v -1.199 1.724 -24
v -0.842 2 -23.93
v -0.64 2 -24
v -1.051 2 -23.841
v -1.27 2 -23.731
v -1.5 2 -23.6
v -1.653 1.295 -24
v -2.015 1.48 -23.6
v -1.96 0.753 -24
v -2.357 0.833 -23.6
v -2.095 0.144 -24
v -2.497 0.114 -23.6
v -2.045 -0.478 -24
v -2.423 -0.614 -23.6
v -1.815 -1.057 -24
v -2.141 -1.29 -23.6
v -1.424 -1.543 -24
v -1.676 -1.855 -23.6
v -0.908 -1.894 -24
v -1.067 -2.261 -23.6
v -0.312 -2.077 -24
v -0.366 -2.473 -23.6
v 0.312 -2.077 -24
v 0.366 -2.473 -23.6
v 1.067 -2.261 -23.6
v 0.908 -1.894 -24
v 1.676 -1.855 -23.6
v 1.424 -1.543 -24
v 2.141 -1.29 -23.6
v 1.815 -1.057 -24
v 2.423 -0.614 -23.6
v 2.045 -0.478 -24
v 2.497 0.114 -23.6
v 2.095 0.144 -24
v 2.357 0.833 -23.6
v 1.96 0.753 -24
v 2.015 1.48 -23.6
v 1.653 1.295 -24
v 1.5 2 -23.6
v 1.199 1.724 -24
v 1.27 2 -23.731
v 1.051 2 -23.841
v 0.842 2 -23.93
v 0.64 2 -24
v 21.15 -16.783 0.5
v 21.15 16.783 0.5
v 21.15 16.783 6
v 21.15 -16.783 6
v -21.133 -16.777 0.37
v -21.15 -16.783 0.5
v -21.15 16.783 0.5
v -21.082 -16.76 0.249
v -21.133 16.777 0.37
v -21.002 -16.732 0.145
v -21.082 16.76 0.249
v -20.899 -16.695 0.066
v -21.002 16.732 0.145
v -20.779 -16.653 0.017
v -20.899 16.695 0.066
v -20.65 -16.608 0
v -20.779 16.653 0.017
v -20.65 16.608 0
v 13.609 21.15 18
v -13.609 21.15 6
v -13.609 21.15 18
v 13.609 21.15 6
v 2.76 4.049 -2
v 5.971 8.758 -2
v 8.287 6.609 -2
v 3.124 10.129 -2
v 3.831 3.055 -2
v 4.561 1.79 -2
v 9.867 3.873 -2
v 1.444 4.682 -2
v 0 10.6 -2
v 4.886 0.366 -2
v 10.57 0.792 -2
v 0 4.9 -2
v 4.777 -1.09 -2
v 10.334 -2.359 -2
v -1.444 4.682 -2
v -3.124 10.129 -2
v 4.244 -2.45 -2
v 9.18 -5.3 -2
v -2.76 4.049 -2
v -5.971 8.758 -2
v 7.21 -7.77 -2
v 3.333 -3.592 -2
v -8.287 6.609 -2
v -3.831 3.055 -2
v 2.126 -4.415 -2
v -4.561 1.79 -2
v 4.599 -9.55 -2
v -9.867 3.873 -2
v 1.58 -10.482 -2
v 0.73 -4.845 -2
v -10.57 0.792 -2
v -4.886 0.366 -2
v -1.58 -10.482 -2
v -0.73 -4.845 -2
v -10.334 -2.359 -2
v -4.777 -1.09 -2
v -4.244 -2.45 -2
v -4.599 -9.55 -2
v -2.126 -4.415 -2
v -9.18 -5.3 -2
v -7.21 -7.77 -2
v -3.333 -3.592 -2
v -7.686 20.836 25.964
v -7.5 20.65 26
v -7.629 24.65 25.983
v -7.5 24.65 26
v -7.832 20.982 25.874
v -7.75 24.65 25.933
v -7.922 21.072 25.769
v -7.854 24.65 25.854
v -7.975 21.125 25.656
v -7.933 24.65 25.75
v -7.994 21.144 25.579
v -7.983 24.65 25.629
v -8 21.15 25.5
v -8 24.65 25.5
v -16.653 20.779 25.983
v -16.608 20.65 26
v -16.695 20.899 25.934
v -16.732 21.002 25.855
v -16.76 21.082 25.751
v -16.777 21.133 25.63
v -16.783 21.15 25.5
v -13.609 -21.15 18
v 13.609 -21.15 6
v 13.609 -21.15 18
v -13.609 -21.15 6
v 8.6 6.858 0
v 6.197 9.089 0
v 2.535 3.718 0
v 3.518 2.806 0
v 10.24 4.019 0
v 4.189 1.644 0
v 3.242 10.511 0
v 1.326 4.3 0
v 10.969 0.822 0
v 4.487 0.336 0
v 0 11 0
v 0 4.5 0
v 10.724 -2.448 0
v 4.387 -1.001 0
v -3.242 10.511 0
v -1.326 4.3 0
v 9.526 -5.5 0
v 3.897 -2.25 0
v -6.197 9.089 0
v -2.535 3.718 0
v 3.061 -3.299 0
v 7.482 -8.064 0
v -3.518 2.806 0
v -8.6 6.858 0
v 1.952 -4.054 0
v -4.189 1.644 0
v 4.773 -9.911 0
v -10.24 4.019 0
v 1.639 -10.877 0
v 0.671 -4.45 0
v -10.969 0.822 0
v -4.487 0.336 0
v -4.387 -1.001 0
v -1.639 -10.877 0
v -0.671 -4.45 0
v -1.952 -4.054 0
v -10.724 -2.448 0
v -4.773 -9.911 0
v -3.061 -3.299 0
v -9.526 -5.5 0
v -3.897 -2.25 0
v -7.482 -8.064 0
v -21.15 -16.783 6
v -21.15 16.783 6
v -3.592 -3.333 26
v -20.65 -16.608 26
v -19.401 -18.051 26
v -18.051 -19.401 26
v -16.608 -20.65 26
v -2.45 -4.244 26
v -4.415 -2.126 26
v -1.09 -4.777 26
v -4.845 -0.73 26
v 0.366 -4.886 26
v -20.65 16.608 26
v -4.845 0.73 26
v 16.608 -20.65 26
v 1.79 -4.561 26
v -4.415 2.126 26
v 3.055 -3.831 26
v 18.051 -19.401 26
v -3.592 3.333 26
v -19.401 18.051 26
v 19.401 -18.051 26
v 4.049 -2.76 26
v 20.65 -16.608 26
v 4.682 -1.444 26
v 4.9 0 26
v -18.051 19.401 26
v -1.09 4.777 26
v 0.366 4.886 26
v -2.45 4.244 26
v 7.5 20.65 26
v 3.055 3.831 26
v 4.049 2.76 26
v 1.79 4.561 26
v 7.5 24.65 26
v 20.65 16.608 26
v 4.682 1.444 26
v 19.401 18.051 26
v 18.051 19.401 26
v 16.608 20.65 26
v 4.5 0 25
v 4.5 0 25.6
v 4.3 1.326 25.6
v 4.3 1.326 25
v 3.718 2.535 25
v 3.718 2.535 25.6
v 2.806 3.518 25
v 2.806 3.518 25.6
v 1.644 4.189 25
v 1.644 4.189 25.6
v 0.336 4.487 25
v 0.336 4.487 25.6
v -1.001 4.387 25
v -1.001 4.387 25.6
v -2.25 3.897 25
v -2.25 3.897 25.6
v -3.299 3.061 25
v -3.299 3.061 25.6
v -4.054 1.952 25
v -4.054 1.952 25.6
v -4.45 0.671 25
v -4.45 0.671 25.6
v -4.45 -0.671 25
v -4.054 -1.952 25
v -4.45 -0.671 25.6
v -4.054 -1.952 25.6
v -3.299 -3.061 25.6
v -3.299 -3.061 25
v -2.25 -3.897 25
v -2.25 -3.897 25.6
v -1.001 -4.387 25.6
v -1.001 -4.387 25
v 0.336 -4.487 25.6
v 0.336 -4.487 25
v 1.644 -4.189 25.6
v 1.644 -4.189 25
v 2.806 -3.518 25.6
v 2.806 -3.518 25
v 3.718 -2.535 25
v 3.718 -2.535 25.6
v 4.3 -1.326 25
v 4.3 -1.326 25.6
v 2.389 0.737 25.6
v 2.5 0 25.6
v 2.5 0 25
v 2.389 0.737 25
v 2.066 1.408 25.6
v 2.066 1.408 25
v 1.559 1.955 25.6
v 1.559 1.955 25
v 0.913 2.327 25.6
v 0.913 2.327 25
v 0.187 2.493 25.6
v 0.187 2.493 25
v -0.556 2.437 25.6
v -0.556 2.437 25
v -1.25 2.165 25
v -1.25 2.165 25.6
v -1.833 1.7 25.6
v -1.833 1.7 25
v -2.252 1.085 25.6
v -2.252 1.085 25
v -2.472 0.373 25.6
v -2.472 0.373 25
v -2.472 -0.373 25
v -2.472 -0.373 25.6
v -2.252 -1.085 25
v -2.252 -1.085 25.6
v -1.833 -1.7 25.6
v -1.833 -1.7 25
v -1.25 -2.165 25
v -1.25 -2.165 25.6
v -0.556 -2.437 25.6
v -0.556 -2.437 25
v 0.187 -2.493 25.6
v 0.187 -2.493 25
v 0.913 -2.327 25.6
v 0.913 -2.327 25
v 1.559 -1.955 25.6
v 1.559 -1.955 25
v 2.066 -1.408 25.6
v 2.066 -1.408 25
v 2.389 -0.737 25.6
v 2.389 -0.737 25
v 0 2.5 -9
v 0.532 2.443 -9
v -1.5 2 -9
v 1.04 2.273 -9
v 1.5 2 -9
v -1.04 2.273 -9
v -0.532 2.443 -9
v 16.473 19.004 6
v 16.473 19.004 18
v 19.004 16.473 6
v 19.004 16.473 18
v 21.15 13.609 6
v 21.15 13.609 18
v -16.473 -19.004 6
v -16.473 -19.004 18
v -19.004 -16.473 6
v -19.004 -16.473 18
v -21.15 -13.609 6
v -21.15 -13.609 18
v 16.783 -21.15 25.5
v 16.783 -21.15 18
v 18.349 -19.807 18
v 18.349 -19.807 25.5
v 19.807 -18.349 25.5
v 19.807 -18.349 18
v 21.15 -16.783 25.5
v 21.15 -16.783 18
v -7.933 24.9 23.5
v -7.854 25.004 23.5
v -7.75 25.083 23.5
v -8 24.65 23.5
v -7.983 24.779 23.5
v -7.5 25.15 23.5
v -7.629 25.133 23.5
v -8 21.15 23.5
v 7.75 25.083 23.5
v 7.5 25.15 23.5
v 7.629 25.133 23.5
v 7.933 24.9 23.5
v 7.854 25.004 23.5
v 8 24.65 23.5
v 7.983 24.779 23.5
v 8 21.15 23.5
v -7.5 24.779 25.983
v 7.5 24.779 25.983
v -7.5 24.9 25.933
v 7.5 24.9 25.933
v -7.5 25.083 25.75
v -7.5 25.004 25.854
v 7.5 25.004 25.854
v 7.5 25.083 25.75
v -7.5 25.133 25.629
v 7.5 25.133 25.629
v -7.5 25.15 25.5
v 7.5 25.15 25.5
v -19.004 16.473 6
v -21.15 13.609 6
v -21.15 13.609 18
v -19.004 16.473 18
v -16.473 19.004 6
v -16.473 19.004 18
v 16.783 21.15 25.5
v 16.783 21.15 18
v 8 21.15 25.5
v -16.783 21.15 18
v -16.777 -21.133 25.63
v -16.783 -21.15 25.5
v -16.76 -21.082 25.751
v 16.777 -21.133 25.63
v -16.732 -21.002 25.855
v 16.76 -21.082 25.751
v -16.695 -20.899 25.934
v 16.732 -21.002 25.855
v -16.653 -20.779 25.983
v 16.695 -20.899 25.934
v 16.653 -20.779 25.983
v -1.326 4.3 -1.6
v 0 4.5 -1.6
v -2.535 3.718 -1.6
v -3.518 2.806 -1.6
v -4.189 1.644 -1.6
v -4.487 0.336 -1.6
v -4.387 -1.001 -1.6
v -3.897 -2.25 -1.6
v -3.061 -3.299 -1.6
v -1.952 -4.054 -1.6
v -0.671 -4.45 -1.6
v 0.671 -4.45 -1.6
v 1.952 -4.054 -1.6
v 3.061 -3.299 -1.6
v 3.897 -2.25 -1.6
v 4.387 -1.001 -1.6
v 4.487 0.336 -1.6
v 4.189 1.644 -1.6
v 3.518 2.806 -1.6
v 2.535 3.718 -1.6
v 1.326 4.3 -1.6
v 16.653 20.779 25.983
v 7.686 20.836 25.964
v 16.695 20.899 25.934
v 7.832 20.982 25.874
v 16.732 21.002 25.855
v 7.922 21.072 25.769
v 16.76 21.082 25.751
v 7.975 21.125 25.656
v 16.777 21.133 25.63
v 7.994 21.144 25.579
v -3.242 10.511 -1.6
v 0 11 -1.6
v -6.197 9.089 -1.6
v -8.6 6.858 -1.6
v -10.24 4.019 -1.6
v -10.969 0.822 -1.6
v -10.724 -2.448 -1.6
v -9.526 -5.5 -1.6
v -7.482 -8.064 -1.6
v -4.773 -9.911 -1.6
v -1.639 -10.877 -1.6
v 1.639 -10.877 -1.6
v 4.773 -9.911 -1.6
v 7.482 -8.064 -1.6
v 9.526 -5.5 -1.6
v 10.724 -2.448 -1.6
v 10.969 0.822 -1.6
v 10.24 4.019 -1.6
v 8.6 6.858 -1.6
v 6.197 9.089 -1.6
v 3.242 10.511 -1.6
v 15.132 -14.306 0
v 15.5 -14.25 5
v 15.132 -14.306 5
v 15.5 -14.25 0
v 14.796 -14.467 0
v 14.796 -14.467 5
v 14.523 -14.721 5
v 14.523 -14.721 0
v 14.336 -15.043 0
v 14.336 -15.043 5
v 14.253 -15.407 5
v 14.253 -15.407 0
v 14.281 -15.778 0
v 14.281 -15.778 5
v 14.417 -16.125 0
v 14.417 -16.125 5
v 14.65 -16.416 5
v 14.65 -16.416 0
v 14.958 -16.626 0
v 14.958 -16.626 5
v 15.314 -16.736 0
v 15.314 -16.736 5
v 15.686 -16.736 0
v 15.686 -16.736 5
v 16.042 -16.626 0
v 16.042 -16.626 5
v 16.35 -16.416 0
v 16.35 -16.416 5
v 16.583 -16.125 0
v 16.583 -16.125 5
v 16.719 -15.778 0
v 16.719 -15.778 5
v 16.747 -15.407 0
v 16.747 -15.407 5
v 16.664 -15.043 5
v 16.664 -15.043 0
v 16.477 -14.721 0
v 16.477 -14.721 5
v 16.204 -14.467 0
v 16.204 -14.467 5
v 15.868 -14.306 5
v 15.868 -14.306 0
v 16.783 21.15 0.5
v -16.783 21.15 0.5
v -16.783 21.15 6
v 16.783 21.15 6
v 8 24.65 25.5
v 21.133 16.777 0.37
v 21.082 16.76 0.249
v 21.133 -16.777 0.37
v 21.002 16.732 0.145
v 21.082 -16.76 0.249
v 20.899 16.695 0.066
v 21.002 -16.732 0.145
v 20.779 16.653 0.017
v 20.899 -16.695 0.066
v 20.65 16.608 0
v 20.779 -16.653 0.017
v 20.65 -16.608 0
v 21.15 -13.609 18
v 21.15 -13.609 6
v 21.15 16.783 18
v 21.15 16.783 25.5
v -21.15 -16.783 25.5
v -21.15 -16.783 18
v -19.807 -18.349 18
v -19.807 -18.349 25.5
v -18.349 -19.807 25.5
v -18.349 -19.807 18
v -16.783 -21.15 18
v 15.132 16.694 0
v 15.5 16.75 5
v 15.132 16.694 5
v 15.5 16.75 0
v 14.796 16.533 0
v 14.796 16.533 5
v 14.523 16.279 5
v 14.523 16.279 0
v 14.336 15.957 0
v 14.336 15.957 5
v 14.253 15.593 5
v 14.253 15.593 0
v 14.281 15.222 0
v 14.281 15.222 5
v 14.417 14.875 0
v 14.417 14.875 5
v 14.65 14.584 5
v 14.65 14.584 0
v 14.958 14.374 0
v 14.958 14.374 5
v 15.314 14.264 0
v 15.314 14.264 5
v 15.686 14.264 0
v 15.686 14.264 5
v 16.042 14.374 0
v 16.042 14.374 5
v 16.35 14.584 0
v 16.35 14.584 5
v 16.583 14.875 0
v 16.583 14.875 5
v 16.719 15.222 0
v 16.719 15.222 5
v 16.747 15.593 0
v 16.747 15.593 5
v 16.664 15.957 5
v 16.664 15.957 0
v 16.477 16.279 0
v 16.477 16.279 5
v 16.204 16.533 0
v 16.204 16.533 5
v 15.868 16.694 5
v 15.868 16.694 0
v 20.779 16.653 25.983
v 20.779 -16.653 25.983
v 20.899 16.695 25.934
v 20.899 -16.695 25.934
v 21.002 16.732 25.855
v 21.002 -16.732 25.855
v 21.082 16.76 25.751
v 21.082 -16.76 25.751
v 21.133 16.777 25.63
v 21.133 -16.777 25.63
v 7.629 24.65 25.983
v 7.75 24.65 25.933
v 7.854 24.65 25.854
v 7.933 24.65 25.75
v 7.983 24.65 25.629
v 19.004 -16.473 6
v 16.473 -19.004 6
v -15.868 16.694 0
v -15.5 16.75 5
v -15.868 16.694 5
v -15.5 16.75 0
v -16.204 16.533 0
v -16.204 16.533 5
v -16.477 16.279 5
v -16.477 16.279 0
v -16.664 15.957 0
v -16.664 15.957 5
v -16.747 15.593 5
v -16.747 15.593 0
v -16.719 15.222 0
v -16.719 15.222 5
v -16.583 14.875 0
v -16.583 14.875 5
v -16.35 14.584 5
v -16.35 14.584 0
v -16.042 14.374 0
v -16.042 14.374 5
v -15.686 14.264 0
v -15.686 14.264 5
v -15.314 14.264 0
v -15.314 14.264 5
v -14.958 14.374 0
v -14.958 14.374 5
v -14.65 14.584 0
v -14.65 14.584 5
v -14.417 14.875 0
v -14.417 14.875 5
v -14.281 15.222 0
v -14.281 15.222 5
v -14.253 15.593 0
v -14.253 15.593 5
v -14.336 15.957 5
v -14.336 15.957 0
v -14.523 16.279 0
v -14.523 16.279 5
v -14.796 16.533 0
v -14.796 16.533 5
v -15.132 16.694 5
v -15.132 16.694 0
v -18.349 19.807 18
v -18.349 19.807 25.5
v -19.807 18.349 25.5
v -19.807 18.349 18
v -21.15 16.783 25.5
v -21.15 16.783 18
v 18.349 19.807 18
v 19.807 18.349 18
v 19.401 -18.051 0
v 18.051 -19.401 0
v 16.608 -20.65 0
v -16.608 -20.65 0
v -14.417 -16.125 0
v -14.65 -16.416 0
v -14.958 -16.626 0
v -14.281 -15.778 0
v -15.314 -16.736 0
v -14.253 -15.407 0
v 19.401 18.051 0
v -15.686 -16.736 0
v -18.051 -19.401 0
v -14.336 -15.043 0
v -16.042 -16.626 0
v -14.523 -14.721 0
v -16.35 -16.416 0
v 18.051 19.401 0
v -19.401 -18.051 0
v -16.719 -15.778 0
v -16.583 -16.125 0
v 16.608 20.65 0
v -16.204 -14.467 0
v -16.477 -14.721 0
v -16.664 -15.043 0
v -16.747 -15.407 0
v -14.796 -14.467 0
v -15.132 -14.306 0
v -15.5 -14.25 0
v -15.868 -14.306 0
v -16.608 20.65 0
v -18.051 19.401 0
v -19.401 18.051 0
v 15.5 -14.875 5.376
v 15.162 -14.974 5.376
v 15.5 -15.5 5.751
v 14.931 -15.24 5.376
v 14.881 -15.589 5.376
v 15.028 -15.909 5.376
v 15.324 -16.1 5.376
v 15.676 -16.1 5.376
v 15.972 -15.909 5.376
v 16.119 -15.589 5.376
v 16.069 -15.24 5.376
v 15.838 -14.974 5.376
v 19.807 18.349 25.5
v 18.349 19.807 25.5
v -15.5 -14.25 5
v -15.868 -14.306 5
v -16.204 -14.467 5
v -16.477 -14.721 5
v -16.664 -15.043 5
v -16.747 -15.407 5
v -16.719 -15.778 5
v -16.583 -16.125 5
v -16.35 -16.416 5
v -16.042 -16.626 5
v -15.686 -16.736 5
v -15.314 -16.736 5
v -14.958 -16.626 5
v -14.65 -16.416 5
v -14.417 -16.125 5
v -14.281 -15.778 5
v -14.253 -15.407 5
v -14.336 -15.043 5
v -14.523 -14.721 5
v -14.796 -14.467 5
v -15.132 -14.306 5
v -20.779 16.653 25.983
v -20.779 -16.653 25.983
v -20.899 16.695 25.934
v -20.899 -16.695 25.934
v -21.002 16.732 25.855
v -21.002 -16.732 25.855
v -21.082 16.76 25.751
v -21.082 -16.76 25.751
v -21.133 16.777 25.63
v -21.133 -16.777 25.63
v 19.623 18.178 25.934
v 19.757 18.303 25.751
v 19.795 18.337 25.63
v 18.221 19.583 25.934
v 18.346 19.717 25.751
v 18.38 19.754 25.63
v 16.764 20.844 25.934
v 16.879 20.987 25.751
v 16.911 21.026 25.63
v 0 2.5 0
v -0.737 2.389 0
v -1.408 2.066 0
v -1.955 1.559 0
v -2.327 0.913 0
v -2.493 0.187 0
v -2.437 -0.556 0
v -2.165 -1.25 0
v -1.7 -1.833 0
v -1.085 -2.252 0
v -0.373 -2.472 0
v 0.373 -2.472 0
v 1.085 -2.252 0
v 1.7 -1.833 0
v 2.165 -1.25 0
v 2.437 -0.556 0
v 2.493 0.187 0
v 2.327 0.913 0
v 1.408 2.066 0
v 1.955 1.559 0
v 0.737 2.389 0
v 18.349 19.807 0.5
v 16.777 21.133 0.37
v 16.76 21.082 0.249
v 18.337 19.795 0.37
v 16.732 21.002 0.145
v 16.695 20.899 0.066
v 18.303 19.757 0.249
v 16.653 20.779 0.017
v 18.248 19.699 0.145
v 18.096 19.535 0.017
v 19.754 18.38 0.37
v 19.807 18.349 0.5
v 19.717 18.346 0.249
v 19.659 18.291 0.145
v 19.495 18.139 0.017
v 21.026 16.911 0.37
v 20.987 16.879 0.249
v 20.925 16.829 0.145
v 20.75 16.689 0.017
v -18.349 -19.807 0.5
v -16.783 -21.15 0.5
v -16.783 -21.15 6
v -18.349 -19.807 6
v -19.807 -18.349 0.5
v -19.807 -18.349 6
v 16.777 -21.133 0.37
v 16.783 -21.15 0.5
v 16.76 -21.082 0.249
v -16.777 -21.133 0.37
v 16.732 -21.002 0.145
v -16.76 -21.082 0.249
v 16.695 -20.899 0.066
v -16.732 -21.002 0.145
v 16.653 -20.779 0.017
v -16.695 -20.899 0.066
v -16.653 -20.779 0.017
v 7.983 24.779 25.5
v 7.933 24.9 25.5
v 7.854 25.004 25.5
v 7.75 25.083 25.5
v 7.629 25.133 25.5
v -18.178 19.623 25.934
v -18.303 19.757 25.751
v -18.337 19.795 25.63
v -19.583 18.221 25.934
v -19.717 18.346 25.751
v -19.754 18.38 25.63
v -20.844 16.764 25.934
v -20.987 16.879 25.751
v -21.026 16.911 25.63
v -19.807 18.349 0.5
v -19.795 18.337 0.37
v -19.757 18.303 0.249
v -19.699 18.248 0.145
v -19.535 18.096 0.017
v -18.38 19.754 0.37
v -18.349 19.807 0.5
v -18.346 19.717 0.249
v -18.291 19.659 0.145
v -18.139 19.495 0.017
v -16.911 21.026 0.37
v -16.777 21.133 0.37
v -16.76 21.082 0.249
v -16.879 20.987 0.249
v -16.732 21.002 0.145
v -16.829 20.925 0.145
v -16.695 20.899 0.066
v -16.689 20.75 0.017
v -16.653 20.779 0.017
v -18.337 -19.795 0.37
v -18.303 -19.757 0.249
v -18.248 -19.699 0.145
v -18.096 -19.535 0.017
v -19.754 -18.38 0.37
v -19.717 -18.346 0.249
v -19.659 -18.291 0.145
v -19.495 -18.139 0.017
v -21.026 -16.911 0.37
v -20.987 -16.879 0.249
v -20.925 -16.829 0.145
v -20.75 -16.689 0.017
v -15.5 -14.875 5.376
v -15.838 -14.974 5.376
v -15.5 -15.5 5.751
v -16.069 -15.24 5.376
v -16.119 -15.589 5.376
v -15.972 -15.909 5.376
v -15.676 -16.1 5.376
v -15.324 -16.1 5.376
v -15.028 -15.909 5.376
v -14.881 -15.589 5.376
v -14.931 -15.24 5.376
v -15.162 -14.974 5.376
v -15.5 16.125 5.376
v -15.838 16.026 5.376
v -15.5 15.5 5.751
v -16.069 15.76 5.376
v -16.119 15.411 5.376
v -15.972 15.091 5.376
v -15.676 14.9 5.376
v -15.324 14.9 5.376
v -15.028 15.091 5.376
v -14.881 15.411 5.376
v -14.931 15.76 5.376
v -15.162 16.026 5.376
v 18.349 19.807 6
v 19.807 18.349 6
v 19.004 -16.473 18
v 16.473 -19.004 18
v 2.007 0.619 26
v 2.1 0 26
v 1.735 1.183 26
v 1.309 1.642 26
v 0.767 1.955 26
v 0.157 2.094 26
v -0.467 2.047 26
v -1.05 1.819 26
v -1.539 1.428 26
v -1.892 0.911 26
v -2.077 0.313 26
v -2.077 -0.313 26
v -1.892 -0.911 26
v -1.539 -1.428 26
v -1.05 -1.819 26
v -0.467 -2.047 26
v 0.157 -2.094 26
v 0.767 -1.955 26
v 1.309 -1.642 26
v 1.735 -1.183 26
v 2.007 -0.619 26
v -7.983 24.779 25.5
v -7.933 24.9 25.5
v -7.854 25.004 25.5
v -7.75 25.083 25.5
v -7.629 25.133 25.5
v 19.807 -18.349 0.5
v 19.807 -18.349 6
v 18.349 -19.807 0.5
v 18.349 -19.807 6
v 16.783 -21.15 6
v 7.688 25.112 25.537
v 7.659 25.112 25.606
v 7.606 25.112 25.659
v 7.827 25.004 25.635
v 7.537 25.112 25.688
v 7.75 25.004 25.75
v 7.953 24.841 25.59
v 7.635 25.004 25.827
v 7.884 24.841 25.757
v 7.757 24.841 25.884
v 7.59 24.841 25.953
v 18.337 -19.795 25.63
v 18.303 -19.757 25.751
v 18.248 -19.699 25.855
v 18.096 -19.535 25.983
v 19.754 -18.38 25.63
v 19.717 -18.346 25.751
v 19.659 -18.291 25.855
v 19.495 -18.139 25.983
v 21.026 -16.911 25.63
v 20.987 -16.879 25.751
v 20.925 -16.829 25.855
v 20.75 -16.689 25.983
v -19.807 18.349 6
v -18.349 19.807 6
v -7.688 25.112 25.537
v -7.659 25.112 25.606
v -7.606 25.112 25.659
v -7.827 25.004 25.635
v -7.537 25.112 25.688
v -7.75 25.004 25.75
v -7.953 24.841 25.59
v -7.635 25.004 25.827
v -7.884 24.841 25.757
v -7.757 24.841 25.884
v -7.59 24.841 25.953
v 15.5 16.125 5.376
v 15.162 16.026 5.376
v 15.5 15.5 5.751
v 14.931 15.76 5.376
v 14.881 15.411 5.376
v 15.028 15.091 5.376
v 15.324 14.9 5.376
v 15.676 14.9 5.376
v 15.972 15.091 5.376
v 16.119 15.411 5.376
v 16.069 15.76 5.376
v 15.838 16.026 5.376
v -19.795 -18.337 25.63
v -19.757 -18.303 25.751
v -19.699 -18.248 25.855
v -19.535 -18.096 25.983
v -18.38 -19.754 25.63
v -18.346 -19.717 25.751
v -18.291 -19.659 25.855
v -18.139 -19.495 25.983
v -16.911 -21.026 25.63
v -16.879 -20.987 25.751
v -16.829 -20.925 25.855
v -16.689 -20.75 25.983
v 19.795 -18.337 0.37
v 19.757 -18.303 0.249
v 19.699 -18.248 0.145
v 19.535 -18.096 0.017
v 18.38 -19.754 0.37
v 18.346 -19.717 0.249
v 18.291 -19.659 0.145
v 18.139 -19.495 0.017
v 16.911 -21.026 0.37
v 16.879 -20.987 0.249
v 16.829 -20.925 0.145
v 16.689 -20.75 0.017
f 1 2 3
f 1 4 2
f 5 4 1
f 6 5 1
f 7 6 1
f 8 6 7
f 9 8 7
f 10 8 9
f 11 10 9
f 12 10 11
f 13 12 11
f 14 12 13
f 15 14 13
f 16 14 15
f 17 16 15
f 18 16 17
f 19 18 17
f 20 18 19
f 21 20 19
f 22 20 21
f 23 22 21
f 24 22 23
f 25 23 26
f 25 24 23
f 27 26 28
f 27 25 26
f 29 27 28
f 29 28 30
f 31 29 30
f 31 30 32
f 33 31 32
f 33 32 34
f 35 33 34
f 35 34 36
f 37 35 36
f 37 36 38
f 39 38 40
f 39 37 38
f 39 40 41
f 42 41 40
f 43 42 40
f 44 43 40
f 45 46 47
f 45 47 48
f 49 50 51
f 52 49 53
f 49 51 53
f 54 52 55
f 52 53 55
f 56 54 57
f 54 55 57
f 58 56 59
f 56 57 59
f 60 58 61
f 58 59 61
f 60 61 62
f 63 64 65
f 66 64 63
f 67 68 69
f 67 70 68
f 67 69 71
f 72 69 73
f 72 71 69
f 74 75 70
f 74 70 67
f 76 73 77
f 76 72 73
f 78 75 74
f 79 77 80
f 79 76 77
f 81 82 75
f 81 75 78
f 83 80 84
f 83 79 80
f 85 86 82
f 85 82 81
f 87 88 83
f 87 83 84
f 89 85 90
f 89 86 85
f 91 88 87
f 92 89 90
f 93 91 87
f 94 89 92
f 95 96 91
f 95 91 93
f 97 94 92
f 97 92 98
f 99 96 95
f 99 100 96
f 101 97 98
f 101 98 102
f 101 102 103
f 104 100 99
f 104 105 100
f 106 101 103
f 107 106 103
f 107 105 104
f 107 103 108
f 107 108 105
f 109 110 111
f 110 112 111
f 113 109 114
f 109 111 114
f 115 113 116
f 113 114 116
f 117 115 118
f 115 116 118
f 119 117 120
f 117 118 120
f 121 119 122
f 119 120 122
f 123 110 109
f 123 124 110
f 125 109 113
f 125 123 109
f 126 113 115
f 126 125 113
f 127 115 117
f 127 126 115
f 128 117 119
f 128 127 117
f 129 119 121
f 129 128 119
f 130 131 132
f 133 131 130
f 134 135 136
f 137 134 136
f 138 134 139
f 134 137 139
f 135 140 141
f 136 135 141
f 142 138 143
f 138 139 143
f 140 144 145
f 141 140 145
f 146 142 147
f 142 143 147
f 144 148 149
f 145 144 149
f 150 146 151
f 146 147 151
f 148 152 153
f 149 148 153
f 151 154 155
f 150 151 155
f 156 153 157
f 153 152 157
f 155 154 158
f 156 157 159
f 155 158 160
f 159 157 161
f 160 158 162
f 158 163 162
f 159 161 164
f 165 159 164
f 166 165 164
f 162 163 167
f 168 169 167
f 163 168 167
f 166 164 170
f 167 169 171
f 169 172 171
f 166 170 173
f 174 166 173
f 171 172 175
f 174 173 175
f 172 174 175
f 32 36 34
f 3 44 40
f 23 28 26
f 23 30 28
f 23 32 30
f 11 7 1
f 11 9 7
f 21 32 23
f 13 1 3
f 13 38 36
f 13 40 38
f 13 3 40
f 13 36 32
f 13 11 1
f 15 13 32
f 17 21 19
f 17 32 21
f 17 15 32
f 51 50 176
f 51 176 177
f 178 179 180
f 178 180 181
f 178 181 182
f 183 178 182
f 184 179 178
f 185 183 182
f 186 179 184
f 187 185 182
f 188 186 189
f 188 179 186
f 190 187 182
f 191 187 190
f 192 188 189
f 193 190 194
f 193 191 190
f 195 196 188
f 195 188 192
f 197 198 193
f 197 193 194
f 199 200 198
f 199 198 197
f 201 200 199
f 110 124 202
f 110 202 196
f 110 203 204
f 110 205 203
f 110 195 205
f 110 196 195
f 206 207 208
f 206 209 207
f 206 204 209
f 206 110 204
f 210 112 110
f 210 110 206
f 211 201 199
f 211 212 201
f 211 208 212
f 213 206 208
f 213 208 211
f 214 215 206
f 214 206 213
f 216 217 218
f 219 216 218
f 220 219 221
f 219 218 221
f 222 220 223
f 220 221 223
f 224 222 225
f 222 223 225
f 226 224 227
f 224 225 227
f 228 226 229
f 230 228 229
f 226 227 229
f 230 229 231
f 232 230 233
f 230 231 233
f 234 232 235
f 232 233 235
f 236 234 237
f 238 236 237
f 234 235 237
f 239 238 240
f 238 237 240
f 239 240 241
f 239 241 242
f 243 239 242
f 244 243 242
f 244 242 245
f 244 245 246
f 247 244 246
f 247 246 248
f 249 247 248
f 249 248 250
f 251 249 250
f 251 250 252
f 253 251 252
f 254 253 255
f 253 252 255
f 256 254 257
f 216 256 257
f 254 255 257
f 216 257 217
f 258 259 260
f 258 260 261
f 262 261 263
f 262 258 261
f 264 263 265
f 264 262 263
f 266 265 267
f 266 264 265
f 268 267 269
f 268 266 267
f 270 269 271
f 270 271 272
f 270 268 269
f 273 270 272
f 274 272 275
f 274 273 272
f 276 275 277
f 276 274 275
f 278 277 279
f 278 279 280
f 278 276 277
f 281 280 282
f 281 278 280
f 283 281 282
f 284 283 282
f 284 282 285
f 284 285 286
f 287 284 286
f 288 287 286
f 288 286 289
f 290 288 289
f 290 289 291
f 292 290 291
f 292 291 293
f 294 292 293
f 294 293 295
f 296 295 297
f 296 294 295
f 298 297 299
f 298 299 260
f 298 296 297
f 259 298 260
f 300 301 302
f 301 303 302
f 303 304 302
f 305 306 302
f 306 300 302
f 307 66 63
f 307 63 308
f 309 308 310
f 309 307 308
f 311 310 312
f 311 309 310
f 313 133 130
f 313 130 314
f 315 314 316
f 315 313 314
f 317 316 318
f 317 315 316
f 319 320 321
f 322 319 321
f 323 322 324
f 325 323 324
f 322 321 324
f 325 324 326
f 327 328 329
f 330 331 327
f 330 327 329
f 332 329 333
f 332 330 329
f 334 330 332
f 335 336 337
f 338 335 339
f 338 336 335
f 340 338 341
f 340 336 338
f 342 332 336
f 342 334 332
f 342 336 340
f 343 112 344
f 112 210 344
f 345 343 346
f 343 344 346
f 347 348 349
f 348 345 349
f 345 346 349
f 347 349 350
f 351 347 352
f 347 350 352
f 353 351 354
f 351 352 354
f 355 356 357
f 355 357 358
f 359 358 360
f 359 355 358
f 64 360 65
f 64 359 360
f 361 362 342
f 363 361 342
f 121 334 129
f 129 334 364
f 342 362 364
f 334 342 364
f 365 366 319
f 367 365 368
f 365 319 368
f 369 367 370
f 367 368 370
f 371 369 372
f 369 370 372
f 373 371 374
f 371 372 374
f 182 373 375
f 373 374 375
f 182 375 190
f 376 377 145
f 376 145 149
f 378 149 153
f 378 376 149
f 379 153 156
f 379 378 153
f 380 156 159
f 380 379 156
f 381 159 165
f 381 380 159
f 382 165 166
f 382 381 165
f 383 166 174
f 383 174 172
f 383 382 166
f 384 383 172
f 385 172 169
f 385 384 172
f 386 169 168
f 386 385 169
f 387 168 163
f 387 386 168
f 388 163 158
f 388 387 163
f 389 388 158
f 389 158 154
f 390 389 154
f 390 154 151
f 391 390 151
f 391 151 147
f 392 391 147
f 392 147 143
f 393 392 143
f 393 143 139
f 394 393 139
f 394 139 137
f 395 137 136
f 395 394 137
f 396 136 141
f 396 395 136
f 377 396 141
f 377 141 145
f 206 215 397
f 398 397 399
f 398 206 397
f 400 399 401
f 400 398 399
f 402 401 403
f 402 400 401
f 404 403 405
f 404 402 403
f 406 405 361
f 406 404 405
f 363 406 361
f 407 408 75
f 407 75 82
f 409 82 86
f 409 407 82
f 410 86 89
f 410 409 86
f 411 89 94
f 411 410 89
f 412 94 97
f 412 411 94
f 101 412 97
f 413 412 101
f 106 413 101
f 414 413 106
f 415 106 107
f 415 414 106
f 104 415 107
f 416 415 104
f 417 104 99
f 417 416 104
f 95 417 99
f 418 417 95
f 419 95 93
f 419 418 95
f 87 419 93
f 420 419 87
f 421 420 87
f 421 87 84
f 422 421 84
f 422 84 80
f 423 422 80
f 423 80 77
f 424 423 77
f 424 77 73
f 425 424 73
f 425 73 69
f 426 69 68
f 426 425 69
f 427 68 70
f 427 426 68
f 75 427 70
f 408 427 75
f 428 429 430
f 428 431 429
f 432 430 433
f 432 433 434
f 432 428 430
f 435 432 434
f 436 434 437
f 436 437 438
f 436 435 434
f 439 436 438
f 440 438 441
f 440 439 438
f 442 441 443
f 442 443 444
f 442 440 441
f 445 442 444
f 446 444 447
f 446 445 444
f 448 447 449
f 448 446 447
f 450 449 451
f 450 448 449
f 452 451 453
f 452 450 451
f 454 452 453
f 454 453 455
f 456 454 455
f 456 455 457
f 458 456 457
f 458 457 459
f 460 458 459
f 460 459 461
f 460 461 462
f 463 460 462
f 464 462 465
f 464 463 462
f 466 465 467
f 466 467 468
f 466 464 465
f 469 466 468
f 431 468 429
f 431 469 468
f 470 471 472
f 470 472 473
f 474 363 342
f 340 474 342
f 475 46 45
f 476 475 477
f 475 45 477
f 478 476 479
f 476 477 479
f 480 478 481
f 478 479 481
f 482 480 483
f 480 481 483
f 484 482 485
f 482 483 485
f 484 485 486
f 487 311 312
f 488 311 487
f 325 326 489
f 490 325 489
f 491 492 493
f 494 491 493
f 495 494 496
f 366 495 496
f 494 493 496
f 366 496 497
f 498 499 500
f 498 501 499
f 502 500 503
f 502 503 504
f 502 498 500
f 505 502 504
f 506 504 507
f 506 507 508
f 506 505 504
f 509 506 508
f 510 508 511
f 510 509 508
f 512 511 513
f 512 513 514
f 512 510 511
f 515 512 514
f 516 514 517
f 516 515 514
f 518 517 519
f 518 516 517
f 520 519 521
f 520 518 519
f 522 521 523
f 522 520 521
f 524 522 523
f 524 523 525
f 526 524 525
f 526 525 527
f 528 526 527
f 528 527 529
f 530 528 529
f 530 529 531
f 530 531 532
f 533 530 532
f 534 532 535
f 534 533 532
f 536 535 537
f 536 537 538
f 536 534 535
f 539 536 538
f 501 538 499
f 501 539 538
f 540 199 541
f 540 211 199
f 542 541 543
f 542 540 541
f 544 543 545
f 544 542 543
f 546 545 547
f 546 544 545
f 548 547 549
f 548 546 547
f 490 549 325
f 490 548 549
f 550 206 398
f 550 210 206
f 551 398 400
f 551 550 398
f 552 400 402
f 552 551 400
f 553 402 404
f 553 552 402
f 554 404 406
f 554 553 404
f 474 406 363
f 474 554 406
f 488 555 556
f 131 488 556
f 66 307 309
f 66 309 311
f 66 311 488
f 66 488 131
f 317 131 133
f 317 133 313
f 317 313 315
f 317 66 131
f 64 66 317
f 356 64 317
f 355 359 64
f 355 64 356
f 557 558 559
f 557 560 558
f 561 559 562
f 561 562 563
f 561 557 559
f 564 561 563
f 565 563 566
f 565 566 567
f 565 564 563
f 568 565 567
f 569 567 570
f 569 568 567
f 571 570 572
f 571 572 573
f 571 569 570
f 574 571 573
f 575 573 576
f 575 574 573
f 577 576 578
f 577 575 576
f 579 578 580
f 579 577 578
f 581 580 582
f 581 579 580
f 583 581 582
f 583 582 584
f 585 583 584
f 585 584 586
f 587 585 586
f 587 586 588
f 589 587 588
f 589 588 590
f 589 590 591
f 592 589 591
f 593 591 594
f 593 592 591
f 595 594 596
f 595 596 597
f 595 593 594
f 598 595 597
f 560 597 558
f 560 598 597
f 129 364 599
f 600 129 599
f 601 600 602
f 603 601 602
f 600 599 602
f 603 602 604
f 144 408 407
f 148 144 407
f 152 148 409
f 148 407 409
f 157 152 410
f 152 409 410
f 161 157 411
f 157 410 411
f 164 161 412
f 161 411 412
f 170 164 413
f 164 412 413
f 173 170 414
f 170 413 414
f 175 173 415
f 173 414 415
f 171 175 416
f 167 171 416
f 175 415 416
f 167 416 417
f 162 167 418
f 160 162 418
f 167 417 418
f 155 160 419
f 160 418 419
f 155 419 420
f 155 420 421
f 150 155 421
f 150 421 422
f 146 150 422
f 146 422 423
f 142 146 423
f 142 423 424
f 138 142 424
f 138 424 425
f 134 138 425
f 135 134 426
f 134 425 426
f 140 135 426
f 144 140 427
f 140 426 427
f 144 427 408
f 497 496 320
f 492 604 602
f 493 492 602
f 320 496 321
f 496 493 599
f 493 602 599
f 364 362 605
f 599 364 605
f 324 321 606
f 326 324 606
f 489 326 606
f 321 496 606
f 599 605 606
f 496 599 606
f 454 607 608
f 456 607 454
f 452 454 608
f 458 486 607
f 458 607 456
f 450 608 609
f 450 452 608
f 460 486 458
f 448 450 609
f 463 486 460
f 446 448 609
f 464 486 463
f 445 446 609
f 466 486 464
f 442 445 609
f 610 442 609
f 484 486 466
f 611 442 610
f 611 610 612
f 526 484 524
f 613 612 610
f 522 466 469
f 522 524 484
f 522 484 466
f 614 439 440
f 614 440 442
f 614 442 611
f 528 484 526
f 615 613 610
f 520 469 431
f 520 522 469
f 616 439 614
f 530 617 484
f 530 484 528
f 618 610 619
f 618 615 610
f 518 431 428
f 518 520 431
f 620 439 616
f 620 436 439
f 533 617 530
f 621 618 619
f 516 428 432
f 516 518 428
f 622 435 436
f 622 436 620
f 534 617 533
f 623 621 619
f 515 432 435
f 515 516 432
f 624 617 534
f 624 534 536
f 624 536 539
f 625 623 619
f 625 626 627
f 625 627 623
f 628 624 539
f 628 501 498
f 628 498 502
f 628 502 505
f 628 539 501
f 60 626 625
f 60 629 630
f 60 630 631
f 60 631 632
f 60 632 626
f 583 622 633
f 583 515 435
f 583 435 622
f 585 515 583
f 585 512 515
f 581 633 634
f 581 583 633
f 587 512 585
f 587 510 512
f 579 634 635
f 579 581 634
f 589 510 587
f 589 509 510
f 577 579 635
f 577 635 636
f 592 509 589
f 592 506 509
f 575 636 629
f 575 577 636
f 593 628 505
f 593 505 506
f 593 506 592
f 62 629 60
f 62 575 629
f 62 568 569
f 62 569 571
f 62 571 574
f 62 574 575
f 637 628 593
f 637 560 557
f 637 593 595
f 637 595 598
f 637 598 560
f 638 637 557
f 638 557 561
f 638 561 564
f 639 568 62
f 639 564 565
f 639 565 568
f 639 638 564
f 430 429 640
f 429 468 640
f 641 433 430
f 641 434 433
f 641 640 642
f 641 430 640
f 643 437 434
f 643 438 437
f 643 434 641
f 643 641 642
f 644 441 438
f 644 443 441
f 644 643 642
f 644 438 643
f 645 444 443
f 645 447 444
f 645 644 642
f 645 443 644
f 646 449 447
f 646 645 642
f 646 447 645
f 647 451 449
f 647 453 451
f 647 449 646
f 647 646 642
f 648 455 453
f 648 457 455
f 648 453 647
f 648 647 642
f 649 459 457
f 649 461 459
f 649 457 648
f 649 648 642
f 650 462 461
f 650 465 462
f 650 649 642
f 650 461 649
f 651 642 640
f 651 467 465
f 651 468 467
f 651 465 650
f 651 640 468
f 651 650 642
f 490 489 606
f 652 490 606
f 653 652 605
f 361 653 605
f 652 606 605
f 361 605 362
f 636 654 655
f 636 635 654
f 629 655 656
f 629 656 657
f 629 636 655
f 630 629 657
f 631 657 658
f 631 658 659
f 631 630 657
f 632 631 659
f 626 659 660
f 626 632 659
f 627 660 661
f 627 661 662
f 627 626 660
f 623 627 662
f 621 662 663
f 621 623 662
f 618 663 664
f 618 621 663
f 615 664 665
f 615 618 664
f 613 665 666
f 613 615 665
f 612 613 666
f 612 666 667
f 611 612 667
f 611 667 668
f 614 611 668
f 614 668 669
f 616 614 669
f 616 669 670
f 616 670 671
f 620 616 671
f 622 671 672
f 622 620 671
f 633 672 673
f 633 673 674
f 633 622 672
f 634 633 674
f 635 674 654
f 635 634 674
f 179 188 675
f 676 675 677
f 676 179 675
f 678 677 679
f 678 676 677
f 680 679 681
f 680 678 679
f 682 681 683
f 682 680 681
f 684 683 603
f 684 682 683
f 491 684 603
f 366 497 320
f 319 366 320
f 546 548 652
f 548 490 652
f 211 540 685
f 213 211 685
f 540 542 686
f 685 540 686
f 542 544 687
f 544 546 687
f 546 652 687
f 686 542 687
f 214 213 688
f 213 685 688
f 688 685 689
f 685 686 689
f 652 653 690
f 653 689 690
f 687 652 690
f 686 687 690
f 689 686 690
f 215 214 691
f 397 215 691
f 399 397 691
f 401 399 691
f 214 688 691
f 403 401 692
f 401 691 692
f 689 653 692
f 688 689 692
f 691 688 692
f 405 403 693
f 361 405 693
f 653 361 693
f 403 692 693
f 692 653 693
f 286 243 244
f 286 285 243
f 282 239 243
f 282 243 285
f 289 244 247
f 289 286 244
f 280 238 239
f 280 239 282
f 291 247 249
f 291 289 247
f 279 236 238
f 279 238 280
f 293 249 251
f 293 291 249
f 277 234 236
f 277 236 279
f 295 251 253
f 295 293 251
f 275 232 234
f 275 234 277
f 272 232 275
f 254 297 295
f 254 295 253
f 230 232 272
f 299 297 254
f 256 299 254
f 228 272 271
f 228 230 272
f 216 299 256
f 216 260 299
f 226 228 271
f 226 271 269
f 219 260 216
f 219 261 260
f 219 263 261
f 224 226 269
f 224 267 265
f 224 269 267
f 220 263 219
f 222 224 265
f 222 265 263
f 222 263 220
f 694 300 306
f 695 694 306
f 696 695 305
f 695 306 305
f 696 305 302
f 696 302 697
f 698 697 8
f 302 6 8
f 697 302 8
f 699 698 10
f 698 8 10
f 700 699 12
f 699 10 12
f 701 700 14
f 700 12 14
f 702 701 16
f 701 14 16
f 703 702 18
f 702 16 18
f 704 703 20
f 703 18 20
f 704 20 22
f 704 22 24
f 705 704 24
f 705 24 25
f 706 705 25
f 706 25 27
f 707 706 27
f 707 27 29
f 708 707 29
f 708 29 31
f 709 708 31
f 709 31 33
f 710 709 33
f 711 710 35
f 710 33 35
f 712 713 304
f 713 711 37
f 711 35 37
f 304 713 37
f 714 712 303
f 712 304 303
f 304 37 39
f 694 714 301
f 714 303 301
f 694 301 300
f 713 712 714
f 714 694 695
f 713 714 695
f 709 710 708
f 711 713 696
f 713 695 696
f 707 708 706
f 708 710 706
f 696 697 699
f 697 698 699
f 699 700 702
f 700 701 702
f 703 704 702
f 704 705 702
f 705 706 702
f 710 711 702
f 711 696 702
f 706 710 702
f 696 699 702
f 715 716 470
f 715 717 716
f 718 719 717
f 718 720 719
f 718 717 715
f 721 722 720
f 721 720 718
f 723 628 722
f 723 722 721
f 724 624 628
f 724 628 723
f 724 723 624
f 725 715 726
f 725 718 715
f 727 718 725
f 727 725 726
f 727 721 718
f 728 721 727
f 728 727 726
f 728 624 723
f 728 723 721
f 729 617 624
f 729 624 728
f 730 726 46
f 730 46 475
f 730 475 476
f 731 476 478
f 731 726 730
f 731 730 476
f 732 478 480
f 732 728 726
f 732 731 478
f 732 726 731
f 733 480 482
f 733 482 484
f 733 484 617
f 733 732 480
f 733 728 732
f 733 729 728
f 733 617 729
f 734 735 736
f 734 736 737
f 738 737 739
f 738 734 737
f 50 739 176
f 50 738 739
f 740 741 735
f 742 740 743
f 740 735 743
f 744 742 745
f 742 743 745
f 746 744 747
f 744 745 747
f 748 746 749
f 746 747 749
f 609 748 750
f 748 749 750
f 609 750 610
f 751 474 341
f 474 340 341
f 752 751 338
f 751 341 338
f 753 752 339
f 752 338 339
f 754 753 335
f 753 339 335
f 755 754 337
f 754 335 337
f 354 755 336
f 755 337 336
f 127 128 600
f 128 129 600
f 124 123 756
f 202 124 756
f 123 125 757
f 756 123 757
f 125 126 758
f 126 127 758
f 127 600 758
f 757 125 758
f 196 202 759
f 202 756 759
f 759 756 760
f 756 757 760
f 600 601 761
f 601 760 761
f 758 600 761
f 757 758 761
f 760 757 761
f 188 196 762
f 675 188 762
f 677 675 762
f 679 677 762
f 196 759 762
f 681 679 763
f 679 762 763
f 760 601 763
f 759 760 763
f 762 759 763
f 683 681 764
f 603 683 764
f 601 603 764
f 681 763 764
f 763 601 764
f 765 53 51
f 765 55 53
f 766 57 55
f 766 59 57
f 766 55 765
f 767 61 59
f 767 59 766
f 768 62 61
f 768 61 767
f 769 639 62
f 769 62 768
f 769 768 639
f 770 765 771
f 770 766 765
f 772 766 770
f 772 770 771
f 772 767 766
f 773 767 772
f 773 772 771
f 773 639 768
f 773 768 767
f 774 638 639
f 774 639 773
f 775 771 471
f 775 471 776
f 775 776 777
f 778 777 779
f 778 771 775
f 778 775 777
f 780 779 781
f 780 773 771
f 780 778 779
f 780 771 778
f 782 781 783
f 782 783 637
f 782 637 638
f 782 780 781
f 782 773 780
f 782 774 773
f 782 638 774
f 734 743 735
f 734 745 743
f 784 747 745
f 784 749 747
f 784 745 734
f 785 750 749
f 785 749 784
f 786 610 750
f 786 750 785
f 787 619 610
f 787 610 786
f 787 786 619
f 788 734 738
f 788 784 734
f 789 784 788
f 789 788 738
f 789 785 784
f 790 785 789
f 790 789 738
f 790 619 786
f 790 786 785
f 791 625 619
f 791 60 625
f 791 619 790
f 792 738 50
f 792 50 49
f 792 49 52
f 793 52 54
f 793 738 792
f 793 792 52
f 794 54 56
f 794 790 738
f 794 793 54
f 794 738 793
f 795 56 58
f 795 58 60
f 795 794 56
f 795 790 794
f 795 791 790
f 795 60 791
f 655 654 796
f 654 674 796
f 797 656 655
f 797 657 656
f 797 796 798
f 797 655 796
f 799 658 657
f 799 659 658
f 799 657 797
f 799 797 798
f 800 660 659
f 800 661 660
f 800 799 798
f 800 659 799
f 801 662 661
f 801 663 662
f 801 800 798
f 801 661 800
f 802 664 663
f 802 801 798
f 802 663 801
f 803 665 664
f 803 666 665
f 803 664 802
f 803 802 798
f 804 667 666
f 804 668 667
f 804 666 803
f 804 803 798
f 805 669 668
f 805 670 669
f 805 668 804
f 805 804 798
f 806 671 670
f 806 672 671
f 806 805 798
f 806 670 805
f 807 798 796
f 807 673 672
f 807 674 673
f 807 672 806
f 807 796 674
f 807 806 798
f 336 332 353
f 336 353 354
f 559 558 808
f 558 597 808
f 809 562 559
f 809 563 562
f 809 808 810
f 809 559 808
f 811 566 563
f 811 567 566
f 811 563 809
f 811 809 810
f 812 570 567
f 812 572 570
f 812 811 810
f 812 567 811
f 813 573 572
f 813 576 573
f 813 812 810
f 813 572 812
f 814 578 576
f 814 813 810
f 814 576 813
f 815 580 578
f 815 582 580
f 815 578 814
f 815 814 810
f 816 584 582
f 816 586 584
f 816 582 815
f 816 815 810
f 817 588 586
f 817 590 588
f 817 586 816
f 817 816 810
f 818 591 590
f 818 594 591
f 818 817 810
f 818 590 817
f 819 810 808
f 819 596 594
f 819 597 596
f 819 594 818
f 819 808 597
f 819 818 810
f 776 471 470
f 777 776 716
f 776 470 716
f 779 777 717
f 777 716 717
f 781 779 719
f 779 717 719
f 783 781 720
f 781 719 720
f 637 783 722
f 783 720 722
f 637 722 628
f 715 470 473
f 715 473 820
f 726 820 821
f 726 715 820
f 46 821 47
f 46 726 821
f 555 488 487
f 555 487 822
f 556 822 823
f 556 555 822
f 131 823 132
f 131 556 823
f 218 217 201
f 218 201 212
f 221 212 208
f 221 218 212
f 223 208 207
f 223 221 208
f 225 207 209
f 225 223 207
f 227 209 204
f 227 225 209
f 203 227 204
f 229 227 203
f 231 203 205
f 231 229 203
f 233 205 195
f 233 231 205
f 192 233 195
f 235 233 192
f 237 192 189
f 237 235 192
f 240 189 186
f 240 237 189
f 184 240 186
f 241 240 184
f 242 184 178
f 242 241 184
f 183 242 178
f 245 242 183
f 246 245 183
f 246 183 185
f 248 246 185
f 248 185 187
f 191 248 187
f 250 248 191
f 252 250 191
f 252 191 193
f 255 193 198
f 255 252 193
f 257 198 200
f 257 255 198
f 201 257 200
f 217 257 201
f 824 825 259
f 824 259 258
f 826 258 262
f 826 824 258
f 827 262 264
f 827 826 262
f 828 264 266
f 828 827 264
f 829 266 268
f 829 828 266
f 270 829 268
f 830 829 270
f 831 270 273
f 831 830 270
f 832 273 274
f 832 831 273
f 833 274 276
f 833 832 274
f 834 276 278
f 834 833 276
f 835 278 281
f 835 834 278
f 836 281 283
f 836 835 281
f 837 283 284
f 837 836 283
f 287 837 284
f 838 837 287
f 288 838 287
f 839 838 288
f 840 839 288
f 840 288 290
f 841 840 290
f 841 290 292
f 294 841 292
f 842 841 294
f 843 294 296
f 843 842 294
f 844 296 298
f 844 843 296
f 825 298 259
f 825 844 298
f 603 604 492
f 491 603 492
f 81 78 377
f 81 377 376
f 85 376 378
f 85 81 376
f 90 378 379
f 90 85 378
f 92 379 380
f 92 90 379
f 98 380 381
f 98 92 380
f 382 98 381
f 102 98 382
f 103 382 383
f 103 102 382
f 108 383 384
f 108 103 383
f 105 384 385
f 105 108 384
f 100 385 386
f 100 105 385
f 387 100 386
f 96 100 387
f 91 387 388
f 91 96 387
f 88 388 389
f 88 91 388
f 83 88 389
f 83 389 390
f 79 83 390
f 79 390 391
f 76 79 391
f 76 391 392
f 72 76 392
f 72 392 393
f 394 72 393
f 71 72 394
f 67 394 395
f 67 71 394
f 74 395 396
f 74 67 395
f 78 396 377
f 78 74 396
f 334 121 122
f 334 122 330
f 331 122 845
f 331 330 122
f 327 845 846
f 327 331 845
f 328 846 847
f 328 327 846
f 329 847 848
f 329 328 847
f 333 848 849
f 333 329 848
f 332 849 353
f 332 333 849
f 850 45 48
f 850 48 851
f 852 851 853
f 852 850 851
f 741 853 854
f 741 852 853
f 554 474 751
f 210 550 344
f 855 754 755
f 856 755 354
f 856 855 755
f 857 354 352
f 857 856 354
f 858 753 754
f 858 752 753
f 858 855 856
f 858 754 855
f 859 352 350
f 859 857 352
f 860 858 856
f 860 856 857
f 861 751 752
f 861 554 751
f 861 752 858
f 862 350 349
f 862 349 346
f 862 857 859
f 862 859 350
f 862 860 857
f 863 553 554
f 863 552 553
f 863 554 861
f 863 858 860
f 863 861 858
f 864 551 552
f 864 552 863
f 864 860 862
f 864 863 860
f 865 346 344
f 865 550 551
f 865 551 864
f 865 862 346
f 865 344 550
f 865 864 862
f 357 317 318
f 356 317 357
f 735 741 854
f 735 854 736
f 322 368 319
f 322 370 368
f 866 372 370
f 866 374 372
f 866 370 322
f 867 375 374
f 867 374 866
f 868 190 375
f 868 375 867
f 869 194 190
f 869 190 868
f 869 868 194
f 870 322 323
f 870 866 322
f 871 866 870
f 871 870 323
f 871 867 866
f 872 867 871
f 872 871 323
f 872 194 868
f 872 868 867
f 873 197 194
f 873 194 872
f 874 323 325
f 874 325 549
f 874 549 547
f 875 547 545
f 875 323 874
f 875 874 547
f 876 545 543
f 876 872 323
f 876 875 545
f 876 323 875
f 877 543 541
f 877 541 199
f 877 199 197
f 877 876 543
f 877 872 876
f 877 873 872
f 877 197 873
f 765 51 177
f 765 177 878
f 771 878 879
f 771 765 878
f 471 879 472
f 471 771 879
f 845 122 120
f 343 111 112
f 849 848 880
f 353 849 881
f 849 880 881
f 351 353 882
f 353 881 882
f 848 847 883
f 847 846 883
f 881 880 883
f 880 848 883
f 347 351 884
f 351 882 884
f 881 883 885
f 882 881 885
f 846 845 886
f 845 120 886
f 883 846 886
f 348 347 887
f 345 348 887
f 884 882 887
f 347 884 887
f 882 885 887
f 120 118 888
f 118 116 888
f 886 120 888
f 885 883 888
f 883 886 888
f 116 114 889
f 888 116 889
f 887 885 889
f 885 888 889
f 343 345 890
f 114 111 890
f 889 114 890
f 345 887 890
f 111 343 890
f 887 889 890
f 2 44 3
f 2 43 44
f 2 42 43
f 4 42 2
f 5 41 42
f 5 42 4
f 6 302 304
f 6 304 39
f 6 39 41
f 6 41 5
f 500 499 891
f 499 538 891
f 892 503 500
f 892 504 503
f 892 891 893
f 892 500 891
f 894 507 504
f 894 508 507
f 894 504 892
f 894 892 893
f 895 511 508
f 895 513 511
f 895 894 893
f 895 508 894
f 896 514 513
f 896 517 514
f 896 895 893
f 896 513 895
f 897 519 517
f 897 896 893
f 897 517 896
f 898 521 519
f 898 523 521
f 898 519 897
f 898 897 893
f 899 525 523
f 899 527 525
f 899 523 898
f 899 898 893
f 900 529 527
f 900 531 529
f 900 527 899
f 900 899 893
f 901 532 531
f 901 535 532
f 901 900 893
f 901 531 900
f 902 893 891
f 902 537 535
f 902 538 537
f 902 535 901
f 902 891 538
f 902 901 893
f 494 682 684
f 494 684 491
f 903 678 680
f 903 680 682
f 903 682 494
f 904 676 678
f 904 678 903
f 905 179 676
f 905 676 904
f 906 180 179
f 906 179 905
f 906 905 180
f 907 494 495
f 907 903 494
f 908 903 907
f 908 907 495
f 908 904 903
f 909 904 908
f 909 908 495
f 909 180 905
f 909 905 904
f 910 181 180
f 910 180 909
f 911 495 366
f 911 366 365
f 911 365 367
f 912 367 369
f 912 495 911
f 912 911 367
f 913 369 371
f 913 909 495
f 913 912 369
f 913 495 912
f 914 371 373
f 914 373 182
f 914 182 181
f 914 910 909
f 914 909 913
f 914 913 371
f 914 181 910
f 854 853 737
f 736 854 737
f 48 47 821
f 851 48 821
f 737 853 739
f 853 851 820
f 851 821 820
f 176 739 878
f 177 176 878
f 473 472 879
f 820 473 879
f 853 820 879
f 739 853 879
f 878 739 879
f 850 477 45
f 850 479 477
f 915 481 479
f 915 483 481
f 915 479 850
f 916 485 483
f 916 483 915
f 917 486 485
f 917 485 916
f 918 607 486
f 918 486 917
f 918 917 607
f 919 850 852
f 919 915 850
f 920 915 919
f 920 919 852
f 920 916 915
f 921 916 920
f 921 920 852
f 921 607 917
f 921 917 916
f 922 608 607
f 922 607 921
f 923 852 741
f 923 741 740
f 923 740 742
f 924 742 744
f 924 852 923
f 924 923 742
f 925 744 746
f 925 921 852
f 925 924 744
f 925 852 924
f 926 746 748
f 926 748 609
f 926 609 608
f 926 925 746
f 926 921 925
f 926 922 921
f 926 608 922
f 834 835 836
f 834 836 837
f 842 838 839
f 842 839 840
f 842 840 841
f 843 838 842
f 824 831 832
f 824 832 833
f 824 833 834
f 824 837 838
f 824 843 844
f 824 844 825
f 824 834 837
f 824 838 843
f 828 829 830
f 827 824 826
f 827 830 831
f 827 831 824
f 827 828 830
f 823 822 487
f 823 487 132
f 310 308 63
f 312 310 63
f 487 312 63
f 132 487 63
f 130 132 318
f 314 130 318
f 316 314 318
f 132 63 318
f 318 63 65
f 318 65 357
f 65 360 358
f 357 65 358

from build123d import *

# Parameters (mm, degrees)
BOSS_EXTRU_1_DEPTH           = 6
BOSS_EXTRU_2_DEPTH           = 12
BOSS_EXTRU_3_DEPTH           = 8
ESQUISSE4_W                  = 16
ESQUISSE4_H                  = 2.5
BOSS_EXTRU_4_DEPTH           = 4
ESQUISSE5_W                  = 2
ESQUISSE5_H                  = 6.5
ESQUISSE5_W_2                = 24
ESQUISSE5_H_2                = 2.5
CONG_1_R                     = 0.5
CONG_2_R                     = 0.5
CHANFREIN1_SIZE              = 0.4
CHANFREIN2_SIZE              = 0.4
ESQUISSE6_W                  = 15
ESQUISSE6_H                  = 0.5
ENL_V_MAT_EXTRU_1_DEPTH      = 22.1500001
ENL_V_MAT_EXTRU_1_DEPTH_BACK = 22.1500001
ESQUISSE7_R                  = 4.5
ESQUISSE7_R_2                = 2.5
ENL_V_MAT_EXTRU_2_DEPTH      = 1
CHANFREIN3_SIZE              = 0.4
TROU_TARAUD_M31_AT_2_COUNT   = 2
TROU_TARAUD_M31_AT_2_PITCH   = 31
TROU_TARAUD_M31_AT_3_COUNT   = 2
TROU_TARAUD_M31_AT_3_PITCH   = 43.840620434
TROU_TARAUD_M31_AT_4_COUNT   = 2
TROU_TARAUD_M31_AT_4_PITCH   = 31


with BuildPart() as part:
    # Esquisse1 → Boss.-Extru.1 (new body)
    with BuildSketch(Plane.XY):
        with BuildLine():
            Line((21.15, 16.783250579), (21.15, -16.783250579))
            ThreePointArc((21.15, -16.783250579), (19.091883092, -19.091883092), (16.783250579, -21.15))
            Line((16.783250579, -21.15), (-16.783250579, -21.15))
            ThreePointArc((-16.783250579, -21.15), (-19.091883092, -19.091883092), (-21.15, -16.783250579))
            Line((-21.15, -16.783250579), (-21.15, 16.783250579))
            ThreePointArc((-21.15, 16.783250579), (-19.091883092, 19.091883092), (-16.783250579, 21.15))
            Line((-16.783250579, 21.15), (16.783250579, 21.15))
            ThreePointArc((16.783250579, 21.15), (19.091883092, 19.091883092), (21.15, 16.783250579))
        make_face()
    extrude(amount=BOSS_EXTRU_1_DEPTH)

    # Congé2
    cong_2_edges = [part.edges().sort_by_distance(p)[0] for p in [
        (0, 21.15, 0),
        (19.091883092, 19.091883092, 0),
        (21.15, 0, 0),
        (19.091883092, -19.091883092, 0),
        (0, -21.15, 0),
        (-19.091883092, -19.091883092, 0),
        (-21.15, 0, 0),
        (-19.091883092, 19.091883092, 0),
    ]]
    fillet(cong_2_edges, radius=CONG_2_R)

    # Esquisse9 → Trou taraudé M31 (revolve, cut)
    with BuildSketch(Plane(origin=(15.5, -15.5, 0), x_dir=(0, 1, 0), z_dir=(1, 0, 0))):
        Polygon((0, 0), (0, 5.751075774), (1.25, 5), (1.25, 0), align=None)
    trou_taraud_m31 = revolve(axis=Axis((15.5, -15.5, -6.35), (0, 0, 1)), mode=Mode.SUBTRACT)

    # Trou taraudé M31 at 2: Trou taraudé M31 ×2
    with Locations(*[(0, i * TROU_TARAUD_M31_AT_2_PITCH, 0) for i in range(1, TROU_TARAUD_M31_AT_2_COUNT)]):
        add(trou_taraud_m31, mode=Mode.SUBTRACT)

    # Trou taraudé M31 at 3: Trou taraudé M31 ×2
    with Locations(*[Vector(-0.707106781, 0.707106781, 0) * (i * TROU_TARAUD_M31_AT_3_PITCH) for i in range(1, TROU_TARAUD_M31_AT_3_COUNT)]):
        add(trou_taraud_m31, mode=Mode.SUBTRACT)

    # Trou taraudé M31 at 4: Trou taraudé M31 ×2
    with Locations(*[(-i * TROU_TARAUD_M31_AT_4_PITCH, 0, 0) for i in range(1, TROU_TARAUD_M31_AT_4_COUNT)]):
        add(trou_taraud_m31, mode=Mode.SUBTRACT)


with BuildPart() as body_2:
    # Esquisse2 → Boss.-Extru.2 (new body)
    with BuildSketch(Plane.XY.offset(6)):
        with BuildLine():
            Line((-13.608820669, 21.15), (13.608820669, 21.15))
            ThreePointArc((13.608820669, 21.15), (17.783735547, 17.783735547), (21.15, 13.608820669))
            Line((21.15, 13.608820669), (21.15, -13.608820669))
            ThreePointArc((21.15, -13.608820669), (17.783735547, -17.783735547), (13.608820669, -21.15))
            Line((13.608820669, -21.15), (-13.608820669, -21.15))
            ThreePointArc((-13.608820669, -21.15), (-17.783735547, -17.783735547), (-21.15, -13.608820669))
            Line((-21.15, -13.608820669), (-21.15, 13.608820669))
            ThreePointArc((-21.15, 13.608820669), (-17.783735547, 17.783735547), (-13.608820669, 21.15))
        make_face()
    extrude(amount=BOSS_EXTRU_2_DEPTH)


with BuildPart() as body_3:
    # Esquisse3 → Boss.-Extru.3 (new body)
    with BuildSketch(Plane.XY.offset(18)):
        with BuildLine():
            Line((-16.783250579, -21.15), (16.783250579, -21.15))
            ThreePointArc((16.783250579, -21.15), (19.091883092, -19.091883092), (21.15, -16.783250579))
            Line((21.15, -16.783250579), (21.15, 16.783250579))
            ThreePointArc((21.15, 16.783250579), (19.091883092, 19.091883092), (16.783250579, 21.15))
            Line((16.783250579, 21.15), (-16.783250579, 21.15))
            ThreePointArc((-16.783250579, 21.15), (-19.091883092, 19.091883092), (-21.15, 16.783250579))
            Line((-21.15, 16.783250579), (-21.15, -16.783250579))
            ThreePointArc((-21.15, -16.783250579), (-19.091883092, -19.091883092), (-16.783250579, -21.15))
        make_face()
    extrude(amount=BOSS_EXTRU_3_DEPTH)

    # Esquisse4 → Boss.-Extru.4 (add)
    with BuildSketch(Plane(origin=(0, 21.15, 0), x_dir=(1, 0, 0), z_dir=(0, 1, 0))):
        with Locations((0, -24.75)):
            Rectangle(ESQUISSE4_W, ESQUISSE4_H)
    extrude(amount=BOSS_EXTRU_4_DEPTH)

    # Congé1
    cong_1_edges = [body_3.edges().sort_by_distance(p)[0] for p in [
        (19.091883092, -19.091883092, 26),
        (21.15, 0, 26),
        (19.091883092, 19.091883092, 26),
        (12.39162529, 21.15, 26),
        (-19.091883092, 19.091883092, 26),
        (-21.15, 0, 26),
        (-12.39162529, 21.15, 26),
        (8, 23.15, 26),
        (-8, 23.15, 26),
        (8, 25.15, 24.75),
        (-8, 25.15, 24.75),
        (0, 25.15, 26),
        (-19.091883092, -19.091883092, 26),
        (0, -21.15, 26),
    ]]
    fillet(cong_1_edges, radius=CONG_1_R)

    # Esquisse7 → Enlèv. mat.-Extru.2 (cut)
    with BuildSketch(Plane.XY.offset(26)):
        Circle(ESQUISSE7_R)
        Circle(ESQUISSE7_R_2, mode=Mode.SUBTRACT)
    extrude(amount=-ENL_V_MAT_EXTRU_2_DEPTH, mode=Mode.SUBTRACT)

    # Chanfrein3
    chanfrein3_edges = [body_3.edges().sort_by_distance(p)[0] for p in [
        (-4.5, 0, 26),
        (-2.5, 0, 26),
    ]]
    chamfer(chanfrein3_edges, length=CHANFREIN3_SIZE)


with BuildPart() as body_4:
    # Esquisse5 → Révolution1 (revolve)
    with BuildSketch(Plane(origin=(0, 0, 0), x_dir=(0, 0, -1), z_dir=(1, 0, 0))):
        with Locations((1, 7.75)):
            Rectangle(ESQUISSE5_W, ESQUISSE5_H)
        with Locations((12, 1.25)):
            Rectangle(ESQUISSE5_W_2, ESQUISSE5_H_2)
    revolve(axis=Axis((0, 0, 0), (0, 0, 1)))

    # Chanfrein1
    chanfrein1_edges = [body_4.edges().sort_by_distance(p)[0] for p in [
        (0, -2.5, -24),
    ]]
    chamfer(chanfrein1_edges, length=CHANFREIN1_SIZE)

    # Chanfrein2
    chanfrein2_edges = [body_4.edges().sort_by_distance(p)[0] for p in [
        (0, -11, -2),
        (0, -4.5, -2),
    ]]
    chamfer(chanfrein2_edges, length=CHANFREIN2_SIZE)

    # Esquisse6 → Enlèv. mat.-Extru.1 (cut, two sides)
    with BuildSketch(Plane(origin=(0, 0, 0), x_dir=(0, 0, -1), z_dir=(1, 0, 0))) as enl_v_mat_extru_1_sk:
        with Locations((16.5, 2.25)):
            Rectangle(ESQUISSE6_W, ESQUISSE6_H)
    extrude(amount=ENL_V_MAT_EXTRU_1_DEPTH, mode=Mode.SUBTRACT)
    extrude(enl_v_mat_extru_1_sk.sketch, amount=-ENL_V_MAT_EXTRU_1_DEPTH_BACK, mode=Mode.SUBTRACT)


solid = Compound([part.part, body_2.part, body_3.part, body_4.part])
